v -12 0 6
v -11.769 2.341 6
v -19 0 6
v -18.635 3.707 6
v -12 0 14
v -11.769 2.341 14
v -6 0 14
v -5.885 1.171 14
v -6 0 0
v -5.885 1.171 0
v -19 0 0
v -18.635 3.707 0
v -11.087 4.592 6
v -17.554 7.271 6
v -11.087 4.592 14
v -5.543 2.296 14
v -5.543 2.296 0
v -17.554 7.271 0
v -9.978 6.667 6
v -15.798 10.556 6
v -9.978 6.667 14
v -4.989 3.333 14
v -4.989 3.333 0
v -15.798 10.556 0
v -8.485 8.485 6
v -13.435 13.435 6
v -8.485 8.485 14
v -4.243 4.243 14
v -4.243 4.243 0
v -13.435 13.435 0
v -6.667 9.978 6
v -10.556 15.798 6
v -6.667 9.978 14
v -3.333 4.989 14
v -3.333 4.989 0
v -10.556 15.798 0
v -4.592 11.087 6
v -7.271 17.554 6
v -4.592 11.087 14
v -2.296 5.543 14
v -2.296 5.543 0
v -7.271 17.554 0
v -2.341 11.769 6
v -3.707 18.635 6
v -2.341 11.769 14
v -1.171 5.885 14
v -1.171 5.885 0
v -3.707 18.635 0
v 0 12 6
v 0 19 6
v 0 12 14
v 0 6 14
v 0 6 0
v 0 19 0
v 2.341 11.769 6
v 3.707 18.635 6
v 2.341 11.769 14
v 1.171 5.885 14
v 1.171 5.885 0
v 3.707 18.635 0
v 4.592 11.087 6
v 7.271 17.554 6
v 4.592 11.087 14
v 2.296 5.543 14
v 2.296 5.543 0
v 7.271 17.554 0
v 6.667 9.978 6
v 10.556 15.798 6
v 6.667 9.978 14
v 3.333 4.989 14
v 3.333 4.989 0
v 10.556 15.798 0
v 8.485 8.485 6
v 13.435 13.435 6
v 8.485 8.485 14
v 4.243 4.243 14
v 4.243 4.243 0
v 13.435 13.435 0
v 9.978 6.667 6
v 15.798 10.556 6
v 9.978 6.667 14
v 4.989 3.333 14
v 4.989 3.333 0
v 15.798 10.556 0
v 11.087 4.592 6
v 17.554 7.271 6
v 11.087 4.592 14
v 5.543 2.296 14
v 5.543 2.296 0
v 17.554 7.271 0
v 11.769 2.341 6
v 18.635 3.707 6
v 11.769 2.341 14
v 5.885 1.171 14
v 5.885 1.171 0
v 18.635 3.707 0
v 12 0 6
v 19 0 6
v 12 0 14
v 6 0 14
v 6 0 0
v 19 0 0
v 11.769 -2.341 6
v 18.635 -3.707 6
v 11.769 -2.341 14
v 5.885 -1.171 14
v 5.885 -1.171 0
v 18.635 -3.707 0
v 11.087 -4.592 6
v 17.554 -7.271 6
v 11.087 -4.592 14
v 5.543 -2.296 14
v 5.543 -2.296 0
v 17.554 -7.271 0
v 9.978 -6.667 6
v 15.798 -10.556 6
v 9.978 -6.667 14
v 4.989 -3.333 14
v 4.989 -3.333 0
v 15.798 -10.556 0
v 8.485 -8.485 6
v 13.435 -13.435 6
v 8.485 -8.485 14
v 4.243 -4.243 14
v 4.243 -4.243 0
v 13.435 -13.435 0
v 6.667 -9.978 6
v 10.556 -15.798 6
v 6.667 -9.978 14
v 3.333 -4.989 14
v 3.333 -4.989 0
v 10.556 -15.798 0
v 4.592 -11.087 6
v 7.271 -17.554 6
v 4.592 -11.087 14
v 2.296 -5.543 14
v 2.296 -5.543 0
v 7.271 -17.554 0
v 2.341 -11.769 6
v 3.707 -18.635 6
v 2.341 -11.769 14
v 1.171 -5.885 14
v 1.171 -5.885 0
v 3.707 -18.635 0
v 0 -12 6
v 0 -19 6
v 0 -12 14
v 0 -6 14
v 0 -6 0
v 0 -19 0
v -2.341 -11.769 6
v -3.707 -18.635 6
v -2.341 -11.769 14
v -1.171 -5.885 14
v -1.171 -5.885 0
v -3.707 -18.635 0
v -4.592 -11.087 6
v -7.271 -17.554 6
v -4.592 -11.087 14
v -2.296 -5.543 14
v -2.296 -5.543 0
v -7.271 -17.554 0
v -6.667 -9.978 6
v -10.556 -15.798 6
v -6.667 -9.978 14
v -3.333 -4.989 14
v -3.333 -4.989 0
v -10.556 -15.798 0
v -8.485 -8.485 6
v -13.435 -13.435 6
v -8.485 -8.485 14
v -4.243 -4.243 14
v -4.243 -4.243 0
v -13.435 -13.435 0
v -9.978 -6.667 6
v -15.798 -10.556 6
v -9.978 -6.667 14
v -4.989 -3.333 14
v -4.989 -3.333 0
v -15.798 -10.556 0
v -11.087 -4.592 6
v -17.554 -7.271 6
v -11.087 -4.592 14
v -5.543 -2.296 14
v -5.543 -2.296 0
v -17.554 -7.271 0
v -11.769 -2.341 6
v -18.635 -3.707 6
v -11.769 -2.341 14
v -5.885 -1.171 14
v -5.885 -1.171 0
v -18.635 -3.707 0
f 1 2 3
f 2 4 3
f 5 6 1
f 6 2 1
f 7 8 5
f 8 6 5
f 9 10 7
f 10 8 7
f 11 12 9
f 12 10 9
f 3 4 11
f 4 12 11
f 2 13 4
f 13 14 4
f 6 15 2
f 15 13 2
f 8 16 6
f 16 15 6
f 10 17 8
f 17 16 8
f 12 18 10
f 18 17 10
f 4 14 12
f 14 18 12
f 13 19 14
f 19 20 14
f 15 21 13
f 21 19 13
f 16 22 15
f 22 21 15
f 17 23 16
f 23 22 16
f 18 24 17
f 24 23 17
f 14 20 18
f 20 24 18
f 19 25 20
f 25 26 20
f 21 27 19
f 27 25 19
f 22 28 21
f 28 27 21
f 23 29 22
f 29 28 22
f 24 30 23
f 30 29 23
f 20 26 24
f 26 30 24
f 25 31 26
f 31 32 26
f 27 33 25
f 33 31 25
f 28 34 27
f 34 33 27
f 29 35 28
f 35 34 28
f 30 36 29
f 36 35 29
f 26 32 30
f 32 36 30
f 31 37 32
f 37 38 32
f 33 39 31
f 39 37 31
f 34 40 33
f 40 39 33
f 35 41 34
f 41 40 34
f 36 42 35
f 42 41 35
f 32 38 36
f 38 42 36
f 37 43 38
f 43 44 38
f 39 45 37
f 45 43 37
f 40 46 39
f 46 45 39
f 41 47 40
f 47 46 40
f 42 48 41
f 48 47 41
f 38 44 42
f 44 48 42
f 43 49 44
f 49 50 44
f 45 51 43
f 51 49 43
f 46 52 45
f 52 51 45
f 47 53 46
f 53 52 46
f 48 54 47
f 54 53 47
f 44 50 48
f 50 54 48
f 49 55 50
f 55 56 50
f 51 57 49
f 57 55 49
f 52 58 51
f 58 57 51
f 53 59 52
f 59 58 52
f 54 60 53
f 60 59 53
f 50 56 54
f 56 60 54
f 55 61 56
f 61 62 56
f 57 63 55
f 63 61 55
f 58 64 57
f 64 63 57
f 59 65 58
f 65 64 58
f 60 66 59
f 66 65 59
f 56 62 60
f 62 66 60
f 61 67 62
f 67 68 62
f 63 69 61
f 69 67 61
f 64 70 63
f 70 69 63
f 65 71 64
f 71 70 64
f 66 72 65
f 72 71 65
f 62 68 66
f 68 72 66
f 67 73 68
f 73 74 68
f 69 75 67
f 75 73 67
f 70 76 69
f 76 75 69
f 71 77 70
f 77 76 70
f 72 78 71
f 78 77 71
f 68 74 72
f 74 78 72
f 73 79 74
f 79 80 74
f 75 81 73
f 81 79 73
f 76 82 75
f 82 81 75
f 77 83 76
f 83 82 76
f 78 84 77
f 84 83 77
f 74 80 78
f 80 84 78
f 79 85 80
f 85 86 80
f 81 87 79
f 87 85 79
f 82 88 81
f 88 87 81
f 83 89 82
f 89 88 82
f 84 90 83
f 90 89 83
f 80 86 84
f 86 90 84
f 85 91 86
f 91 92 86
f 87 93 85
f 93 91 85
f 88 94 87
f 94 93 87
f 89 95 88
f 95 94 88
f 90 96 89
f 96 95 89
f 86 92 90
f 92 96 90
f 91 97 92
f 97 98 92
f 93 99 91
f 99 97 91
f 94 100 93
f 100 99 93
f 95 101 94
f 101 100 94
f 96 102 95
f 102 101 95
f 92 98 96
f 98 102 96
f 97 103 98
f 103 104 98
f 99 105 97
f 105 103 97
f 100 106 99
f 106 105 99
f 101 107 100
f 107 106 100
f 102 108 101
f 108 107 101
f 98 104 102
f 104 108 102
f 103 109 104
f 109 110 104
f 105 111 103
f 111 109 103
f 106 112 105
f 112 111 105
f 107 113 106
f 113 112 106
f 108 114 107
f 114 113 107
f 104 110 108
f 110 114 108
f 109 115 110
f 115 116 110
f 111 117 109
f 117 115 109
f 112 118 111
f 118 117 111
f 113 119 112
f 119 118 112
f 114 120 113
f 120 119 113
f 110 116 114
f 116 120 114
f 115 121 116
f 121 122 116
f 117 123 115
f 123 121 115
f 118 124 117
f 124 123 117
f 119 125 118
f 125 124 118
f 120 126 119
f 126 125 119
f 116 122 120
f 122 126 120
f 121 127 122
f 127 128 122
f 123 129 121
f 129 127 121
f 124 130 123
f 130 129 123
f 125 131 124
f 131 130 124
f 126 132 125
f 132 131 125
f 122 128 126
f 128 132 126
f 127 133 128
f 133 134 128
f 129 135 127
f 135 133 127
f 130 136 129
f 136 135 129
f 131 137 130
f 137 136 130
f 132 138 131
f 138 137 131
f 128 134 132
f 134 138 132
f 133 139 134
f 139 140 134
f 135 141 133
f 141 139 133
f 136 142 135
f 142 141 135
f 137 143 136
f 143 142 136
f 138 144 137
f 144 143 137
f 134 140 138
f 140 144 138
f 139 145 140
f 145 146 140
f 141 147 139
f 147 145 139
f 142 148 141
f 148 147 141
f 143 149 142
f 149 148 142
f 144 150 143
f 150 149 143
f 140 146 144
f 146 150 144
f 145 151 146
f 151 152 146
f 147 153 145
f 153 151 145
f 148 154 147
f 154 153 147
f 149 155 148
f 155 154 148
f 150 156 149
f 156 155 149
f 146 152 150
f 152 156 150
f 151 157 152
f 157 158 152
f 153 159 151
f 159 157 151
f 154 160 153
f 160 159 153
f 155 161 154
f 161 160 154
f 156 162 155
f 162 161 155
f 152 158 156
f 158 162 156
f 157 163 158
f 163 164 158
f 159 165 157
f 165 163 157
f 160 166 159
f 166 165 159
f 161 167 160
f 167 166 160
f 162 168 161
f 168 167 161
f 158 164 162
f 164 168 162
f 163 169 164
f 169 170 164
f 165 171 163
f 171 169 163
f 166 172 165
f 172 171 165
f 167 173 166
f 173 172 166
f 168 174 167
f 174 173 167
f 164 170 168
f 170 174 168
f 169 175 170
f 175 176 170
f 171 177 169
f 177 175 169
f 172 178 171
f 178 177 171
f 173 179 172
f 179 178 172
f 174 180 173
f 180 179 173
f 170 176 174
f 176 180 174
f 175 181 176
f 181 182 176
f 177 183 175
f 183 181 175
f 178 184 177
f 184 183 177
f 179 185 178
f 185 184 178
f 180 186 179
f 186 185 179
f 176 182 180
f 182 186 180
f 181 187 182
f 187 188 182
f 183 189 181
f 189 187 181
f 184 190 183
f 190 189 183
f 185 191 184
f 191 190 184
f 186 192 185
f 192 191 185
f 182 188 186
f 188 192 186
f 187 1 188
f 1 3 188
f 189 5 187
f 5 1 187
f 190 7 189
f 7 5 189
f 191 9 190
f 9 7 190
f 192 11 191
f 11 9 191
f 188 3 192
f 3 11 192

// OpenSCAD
$fn = 32;

// ----------------------------------------------------------------------
// Arc stop: collar, 14 mm thick
// ----------------------------------------------------------------------

// --- parameters (mm) ---
revolve_angle = 360;      // full turn around the Z axis
profile_points = 6;       // points of the closed outline

profile = [[6, 0], [19, 0], [19, 6], [12, 6], [12, 14], [6, 14]];  // single closed polygon, 6 points, counter clockwise

// --- the one profile operation ---
rotate_extrude(angle = revolve_angle) polygon(points = profile);
